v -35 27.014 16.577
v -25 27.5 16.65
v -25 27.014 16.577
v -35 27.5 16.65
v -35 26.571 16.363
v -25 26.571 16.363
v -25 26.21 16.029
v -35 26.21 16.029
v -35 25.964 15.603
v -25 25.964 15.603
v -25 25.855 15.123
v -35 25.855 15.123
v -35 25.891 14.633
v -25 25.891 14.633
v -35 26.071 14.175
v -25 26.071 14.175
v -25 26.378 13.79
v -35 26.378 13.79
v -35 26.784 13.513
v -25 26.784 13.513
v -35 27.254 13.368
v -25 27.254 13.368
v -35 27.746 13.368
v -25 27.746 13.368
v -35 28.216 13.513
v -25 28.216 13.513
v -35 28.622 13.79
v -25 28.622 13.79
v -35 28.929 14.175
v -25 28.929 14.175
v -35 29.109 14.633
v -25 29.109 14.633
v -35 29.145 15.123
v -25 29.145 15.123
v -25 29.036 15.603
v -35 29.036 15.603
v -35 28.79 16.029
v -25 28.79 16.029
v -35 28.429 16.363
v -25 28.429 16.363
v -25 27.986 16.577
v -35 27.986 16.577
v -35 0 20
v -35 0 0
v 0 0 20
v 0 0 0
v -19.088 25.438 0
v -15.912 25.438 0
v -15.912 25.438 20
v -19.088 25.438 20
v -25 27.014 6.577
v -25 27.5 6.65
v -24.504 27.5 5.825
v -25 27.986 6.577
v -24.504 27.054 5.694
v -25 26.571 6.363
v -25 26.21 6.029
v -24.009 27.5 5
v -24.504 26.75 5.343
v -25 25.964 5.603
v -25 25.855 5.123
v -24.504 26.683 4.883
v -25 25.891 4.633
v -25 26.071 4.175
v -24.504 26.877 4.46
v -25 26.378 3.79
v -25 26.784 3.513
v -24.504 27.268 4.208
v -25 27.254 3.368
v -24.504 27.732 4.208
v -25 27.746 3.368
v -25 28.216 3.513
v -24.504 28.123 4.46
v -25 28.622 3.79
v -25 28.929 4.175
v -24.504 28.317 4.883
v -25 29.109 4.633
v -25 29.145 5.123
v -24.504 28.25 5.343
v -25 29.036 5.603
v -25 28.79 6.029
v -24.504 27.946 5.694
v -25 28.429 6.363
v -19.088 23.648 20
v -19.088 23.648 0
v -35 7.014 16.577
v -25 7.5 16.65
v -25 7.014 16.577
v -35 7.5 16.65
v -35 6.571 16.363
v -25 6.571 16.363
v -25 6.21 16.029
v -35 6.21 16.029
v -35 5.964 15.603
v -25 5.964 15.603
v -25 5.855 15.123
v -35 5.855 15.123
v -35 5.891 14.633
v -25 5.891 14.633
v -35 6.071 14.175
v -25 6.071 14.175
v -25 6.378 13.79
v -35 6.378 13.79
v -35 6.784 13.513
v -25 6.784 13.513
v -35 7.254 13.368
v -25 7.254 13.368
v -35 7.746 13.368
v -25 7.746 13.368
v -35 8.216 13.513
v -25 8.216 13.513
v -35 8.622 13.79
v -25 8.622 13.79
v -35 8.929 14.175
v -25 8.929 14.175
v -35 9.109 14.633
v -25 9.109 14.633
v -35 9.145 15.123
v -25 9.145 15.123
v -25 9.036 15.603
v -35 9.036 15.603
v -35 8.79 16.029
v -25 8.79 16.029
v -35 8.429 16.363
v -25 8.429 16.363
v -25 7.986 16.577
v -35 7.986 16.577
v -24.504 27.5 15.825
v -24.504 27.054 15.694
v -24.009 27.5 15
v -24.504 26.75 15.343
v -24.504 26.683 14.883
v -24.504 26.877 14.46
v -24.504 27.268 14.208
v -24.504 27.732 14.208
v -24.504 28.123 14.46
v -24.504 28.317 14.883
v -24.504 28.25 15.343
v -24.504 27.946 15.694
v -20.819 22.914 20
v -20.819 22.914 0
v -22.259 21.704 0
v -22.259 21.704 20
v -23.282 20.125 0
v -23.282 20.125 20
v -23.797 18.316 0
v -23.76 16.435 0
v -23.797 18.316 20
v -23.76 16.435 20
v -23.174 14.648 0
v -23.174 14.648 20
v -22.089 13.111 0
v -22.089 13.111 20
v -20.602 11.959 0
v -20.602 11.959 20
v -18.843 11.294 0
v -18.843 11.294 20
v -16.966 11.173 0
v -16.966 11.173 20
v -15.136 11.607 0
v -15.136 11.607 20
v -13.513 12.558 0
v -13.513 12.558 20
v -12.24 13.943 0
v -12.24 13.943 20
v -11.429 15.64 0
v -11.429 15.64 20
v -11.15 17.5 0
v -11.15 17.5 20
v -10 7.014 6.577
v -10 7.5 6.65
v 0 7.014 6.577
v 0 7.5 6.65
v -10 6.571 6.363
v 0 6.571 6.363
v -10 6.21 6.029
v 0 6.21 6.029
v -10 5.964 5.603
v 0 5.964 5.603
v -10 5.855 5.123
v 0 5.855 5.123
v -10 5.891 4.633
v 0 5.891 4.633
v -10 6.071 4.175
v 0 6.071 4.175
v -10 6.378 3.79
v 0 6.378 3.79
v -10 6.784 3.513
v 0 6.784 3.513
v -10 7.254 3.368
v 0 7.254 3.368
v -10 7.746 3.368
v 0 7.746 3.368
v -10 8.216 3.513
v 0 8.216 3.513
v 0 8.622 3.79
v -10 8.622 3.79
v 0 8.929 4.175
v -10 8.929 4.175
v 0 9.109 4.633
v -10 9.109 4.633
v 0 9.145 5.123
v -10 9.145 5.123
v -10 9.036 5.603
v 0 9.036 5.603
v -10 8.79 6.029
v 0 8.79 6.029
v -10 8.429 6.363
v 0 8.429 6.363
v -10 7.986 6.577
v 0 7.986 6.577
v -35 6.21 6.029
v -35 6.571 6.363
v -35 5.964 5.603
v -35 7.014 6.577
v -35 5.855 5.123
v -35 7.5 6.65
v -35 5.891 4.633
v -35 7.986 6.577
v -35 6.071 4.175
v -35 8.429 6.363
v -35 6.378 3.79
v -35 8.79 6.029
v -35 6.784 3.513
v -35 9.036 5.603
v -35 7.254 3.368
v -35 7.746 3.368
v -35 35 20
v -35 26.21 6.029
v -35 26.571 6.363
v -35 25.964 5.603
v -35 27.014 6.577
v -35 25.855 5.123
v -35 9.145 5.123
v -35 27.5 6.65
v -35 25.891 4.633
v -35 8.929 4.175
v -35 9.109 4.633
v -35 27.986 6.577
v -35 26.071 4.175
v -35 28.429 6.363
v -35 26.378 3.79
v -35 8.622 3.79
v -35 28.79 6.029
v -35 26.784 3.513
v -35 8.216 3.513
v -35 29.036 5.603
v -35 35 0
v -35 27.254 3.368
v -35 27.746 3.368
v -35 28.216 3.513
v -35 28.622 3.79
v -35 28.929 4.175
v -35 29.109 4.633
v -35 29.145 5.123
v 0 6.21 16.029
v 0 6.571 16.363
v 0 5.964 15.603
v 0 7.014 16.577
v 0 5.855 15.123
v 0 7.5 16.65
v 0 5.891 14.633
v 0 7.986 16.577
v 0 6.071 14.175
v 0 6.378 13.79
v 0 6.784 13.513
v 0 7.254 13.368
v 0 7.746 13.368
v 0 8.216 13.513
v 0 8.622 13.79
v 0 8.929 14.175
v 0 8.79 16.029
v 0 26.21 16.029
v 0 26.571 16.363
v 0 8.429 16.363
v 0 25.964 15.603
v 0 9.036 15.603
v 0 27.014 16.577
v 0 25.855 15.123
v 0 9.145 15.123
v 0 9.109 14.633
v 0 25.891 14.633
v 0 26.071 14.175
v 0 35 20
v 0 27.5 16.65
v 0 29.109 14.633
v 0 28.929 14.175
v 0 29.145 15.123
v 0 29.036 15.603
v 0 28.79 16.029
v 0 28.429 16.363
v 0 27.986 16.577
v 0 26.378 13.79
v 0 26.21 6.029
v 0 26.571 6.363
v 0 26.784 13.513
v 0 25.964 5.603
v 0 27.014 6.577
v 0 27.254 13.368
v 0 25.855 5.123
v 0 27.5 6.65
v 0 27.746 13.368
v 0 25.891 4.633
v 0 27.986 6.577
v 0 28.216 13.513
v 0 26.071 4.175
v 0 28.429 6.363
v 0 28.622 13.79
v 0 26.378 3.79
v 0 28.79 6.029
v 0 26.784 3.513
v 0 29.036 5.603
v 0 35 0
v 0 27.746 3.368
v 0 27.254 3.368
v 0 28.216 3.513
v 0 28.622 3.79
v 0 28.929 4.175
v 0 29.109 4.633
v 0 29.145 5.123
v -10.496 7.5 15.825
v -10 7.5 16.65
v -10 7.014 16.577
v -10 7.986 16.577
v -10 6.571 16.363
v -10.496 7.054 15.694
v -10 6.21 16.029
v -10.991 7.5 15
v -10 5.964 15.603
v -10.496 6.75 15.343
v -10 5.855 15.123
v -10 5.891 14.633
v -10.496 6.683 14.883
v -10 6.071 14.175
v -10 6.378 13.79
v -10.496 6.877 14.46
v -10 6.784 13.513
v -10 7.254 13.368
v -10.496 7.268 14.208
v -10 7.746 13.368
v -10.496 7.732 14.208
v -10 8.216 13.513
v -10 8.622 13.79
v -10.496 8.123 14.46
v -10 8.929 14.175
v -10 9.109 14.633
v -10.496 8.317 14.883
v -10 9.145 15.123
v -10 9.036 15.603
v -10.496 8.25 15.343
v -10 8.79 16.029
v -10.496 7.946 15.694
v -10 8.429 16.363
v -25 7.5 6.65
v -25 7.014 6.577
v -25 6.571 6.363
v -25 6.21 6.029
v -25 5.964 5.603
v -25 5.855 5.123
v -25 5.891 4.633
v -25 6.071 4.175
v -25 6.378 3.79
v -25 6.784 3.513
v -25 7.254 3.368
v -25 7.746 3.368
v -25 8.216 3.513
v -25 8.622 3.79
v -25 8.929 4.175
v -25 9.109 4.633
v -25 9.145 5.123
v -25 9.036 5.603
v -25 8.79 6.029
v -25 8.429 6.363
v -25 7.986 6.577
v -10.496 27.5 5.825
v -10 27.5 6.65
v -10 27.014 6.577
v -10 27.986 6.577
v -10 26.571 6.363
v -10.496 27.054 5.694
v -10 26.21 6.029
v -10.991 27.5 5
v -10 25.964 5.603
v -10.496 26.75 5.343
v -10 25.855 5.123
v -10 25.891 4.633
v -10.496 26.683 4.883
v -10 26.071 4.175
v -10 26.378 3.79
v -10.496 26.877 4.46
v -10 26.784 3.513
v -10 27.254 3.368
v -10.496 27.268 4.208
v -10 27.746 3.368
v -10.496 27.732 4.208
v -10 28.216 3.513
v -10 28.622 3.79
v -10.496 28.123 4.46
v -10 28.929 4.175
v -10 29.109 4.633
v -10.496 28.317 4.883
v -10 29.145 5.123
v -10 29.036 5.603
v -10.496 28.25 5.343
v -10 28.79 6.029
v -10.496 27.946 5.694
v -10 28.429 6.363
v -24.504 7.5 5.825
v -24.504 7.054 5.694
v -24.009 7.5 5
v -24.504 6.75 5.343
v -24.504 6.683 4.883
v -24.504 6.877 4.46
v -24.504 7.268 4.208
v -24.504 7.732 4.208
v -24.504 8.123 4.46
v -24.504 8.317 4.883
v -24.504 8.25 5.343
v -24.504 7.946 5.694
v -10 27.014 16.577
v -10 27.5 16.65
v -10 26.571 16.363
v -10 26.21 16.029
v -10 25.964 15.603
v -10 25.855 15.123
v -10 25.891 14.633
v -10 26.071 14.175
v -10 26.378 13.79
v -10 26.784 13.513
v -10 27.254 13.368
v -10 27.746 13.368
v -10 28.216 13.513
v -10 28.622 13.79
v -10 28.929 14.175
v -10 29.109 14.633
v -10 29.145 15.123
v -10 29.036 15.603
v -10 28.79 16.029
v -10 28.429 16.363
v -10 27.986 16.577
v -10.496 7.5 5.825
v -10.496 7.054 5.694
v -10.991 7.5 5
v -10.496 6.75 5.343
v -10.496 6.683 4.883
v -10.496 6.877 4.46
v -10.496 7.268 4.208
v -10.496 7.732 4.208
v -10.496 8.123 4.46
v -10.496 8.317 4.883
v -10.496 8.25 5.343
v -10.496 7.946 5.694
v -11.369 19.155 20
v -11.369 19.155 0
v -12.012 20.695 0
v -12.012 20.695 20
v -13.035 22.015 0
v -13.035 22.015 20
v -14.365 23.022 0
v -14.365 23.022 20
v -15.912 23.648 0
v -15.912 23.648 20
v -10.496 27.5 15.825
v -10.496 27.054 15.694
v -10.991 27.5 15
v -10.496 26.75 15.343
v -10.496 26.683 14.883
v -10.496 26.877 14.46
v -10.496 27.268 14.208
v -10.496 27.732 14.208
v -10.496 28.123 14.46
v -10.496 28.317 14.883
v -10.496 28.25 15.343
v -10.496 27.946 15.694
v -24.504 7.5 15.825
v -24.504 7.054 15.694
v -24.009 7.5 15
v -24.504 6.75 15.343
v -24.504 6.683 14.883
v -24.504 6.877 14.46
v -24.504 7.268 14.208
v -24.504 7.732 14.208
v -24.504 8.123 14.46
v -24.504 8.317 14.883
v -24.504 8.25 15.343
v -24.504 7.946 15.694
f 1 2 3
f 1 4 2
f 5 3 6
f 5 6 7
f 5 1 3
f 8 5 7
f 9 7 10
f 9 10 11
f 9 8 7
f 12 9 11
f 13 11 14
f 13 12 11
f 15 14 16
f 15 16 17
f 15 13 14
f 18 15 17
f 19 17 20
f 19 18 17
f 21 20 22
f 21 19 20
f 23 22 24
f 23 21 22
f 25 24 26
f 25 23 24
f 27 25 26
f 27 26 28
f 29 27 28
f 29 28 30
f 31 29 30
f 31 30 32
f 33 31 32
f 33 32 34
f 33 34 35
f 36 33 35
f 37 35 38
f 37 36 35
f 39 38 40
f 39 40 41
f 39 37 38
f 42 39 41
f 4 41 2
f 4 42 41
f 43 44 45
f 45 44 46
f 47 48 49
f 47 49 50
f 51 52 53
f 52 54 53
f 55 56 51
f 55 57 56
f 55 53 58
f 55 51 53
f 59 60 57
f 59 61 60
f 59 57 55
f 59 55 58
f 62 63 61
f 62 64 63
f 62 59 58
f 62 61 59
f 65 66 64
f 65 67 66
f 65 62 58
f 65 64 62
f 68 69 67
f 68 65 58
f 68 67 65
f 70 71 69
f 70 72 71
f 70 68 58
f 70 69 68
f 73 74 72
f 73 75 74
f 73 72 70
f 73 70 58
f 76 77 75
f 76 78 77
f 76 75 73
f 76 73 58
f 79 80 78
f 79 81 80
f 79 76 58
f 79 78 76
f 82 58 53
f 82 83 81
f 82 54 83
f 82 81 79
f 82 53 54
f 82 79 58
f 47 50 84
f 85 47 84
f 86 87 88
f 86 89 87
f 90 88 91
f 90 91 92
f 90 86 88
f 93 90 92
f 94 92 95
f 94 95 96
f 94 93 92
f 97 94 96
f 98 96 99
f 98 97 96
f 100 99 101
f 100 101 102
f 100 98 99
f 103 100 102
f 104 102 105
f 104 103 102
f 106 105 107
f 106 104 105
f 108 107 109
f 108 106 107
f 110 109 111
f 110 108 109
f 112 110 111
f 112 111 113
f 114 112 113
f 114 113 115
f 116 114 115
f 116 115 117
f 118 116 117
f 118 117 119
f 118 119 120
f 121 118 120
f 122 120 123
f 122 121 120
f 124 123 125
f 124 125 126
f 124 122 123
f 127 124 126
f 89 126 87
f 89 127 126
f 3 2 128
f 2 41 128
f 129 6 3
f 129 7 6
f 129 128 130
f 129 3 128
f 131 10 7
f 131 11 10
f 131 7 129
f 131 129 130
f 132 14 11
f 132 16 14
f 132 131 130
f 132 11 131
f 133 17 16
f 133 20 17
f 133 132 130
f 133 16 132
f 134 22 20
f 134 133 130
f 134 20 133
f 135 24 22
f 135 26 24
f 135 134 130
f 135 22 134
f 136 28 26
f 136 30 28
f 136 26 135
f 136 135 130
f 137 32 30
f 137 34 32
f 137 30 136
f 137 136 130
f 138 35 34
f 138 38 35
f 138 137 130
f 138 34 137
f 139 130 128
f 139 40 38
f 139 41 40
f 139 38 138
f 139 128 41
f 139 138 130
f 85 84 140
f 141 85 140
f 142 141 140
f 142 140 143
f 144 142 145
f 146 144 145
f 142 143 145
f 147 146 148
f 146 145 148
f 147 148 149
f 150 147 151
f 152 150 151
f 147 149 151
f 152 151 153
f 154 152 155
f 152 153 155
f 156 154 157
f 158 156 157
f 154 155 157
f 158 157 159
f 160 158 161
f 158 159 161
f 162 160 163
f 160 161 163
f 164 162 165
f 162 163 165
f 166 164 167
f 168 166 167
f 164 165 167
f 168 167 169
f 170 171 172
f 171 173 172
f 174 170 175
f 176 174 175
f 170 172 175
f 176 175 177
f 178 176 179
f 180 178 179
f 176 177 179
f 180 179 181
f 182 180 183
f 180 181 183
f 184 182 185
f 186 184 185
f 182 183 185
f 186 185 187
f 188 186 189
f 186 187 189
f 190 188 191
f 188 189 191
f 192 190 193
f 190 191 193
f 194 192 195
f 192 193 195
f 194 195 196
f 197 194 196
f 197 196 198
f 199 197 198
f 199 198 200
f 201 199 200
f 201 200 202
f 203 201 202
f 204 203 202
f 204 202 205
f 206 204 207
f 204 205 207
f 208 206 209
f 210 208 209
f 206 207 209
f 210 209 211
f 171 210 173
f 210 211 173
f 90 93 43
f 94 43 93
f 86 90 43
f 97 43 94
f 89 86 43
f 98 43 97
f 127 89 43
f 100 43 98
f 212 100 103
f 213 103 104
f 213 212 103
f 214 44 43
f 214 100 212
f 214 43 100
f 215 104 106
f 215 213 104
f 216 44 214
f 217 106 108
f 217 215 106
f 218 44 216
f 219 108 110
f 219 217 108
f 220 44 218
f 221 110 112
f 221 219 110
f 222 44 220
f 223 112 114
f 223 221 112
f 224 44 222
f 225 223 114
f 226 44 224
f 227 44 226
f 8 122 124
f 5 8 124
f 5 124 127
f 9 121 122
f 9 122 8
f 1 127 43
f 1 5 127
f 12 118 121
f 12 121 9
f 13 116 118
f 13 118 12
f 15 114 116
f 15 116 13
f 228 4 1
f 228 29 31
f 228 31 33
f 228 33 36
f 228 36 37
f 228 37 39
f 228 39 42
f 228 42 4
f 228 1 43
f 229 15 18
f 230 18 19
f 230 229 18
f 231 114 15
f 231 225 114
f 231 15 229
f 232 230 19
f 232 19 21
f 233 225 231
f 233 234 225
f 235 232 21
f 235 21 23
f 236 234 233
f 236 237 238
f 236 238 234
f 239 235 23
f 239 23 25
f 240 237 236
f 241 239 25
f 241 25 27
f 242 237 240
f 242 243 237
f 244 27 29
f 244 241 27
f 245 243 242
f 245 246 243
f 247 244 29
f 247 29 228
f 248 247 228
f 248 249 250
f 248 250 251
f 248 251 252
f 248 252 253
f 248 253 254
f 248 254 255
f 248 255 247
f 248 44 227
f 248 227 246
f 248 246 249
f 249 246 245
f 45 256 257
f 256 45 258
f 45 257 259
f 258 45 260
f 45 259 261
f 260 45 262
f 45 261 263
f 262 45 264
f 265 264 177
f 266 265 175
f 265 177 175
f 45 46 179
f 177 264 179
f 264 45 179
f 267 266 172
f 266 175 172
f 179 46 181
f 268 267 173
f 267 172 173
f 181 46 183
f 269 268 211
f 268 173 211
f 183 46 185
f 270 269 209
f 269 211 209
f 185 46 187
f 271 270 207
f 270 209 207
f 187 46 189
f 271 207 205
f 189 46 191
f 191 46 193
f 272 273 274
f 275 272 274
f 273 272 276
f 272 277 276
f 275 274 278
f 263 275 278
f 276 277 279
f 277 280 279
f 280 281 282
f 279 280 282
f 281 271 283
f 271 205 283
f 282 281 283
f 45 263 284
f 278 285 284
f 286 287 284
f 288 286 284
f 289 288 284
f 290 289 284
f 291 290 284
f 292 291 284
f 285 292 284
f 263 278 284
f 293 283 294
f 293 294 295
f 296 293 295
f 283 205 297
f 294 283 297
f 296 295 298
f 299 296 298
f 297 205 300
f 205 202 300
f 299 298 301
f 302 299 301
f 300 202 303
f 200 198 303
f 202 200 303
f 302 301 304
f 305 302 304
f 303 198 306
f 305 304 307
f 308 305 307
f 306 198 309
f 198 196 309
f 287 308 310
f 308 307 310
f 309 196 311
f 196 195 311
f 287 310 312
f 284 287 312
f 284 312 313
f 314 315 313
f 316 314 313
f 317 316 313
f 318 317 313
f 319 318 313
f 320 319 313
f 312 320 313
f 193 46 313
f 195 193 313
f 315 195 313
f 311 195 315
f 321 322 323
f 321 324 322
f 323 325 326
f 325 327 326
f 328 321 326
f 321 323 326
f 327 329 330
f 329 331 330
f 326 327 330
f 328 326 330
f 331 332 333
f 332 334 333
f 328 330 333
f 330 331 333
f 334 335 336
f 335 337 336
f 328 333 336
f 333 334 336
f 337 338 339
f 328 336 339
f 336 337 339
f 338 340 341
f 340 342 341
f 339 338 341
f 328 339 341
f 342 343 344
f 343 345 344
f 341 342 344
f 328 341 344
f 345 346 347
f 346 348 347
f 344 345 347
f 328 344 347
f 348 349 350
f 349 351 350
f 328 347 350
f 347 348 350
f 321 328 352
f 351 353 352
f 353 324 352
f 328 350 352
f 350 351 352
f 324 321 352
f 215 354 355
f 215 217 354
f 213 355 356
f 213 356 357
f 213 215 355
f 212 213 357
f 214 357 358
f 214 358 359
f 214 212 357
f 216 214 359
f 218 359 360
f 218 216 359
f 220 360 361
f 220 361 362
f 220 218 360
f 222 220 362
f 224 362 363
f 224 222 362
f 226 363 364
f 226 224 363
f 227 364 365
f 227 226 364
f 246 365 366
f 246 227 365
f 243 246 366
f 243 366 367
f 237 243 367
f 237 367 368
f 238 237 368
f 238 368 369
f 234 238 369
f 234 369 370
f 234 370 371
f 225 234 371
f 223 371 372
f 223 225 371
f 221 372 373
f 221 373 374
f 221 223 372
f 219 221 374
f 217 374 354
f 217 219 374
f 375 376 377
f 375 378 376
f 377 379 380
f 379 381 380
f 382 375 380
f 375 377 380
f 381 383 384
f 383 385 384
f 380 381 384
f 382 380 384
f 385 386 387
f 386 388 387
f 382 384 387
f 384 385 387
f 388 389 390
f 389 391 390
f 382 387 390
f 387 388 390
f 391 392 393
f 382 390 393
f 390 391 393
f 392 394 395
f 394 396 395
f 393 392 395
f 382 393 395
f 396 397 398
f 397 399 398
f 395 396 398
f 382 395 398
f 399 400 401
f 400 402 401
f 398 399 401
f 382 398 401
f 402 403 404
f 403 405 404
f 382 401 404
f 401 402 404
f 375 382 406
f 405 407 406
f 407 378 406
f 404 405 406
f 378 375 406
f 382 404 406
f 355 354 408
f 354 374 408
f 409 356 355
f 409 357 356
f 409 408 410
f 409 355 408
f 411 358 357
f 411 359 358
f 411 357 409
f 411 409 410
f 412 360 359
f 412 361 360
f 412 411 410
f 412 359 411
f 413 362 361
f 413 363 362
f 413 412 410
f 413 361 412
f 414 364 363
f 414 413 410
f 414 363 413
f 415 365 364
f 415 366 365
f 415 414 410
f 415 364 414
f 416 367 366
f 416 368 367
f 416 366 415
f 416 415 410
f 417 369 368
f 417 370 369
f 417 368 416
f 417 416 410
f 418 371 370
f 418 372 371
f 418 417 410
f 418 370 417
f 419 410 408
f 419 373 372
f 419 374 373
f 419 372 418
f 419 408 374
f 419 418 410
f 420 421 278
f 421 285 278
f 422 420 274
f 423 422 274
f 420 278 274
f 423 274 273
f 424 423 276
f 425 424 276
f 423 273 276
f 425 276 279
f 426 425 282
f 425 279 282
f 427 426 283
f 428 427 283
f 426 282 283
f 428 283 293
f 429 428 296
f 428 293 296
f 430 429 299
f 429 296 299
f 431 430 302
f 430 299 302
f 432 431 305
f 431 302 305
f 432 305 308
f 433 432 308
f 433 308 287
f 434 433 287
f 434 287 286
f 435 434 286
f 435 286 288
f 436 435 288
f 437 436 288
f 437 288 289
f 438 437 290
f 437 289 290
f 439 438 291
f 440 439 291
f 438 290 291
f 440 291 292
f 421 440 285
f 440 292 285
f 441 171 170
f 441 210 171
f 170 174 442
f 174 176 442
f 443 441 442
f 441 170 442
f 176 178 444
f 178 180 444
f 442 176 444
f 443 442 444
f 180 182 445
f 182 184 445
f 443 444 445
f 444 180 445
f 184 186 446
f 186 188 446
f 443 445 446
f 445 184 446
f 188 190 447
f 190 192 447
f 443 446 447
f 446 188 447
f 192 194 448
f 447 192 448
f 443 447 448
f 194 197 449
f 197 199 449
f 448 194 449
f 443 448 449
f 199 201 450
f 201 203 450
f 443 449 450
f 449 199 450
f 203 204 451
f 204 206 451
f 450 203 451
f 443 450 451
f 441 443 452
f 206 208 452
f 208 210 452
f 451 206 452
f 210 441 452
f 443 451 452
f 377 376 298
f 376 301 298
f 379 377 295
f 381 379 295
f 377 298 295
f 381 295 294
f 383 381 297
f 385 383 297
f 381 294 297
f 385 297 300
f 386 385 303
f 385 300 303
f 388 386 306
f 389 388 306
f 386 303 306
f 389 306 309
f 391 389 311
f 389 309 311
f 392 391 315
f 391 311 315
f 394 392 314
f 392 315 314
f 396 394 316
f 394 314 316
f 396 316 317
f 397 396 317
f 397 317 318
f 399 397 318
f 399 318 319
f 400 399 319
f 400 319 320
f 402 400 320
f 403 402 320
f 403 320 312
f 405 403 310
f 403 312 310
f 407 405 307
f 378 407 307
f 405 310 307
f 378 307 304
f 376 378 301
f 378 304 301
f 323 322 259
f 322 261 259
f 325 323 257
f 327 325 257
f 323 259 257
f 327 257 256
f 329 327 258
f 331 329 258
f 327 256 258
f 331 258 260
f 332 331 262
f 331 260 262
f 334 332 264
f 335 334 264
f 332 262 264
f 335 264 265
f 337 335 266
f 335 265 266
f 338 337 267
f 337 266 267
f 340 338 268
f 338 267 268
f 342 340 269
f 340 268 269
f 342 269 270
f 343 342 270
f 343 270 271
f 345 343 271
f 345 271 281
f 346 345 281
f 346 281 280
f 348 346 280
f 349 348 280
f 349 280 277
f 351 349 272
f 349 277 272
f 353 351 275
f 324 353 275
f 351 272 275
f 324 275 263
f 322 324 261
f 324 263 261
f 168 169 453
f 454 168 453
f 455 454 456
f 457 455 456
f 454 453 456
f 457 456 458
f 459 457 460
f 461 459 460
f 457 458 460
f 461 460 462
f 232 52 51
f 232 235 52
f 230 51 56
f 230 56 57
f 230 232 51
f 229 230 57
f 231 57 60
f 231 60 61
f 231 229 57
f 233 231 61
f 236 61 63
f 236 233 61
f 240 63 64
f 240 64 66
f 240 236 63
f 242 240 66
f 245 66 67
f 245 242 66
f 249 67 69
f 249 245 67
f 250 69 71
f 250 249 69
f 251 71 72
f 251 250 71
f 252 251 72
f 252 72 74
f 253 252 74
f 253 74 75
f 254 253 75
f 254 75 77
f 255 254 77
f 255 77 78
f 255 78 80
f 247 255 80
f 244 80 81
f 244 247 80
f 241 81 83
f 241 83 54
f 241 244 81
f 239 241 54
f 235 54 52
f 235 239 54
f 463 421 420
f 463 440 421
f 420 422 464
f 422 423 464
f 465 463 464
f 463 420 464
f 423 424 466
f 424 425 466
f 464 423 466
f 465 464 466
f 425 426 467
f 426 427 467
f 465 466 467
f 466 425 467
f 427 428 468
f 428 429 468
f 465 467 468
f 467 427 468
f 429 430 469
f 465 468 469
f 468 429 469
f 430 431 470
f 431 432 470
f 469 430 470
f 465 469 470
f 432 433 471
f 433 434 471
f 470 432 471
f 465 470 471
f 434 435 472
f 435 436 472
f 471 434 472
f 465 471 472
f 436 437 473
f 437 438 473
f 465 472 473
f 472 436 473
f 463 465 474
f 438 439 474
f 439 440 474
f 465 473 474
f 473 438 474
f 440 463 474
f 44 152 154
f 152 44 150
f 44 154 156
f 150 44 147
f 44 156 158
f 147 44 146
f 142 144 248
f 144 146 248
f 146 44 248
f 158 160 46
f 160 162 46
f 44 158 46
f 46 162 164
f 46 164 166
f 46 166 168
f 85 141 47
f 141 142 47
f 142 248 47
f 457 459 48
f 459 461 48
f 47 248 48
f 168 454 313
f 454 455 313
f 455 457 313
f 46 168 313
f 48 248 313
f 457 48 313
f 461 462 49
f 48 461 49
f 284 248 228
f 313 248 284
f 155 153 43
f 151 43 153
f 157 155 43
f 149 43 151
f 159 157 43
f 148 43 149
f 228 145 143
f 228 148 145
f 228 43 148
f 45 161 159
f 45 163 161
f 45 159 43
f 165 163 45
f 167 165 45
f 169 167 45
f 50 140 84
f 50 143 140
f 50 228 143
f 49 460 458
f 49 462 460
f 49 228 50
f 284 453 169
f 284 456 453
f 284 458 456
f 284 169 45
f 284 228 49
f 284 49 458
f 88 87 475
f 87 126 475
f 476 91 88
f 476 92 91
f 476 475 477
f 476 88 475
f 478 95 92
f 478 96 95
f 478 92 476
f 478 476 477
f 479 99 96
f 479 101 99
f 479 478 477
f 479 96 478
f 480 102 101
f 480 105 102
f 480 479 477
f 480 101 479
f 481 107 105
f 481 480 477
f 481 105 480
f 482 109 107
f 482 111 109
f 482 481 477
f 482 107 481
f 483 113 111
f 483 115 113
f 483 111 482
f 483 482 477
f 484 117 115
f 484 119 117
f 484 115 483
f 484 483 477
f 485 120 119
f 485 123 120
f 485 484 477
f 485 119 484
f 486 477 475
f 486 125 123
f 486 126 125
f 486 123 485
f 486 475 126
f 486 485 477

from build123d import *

# Parameters (mm, degrees)
SKETCH1_W                      = 35
SKETCH1_H                      = 35
BOSS_EXTRUDE1_DEPTH            = 20
CUT_EXTRUDE1_DEPTH             = 54.38539126
M4X0_7_TAPPED_HOLE1_AT_2_COUNT = 2
M4X0_7_TAPPED_HOLE1_AT_2_PITCH = 22.360679775
M4X0_7_TAPPED_HOLE1_AT_3_COUNT = 2
M4X0_7_TAPPED_HOLE1_AT_3_PITCH = 20
M4X0_7_TAPPED_HOLE1_AT_4_COUNT = 2
M4X0_7_TAPPED_HOLE1_AT_4_PITCH = 10


with BuildPart() as part:
    # Sketch1 → Boss-Extrude1 (new body)
    with BuildSketch(Plane.XY):
        with Locations((-17.5, 17.5)):
            Rectangle(SKETCH1_W, SKETCH1_H)
    extrude(amount=BOSS_EXTRUDE1_DEPTH)

    # Sketch2 → Cut-Extrude1 (cut, through all)
    with BuildSketch(Plane.XY.offset(20)):
        with BuildLine():
            Line((-15.9125, 25.4375), (-19.0875, 25.4375))
            Line((-19.0875, 25.4375), (-19.0875, 23.648361062))
            ThreePointArc((-19.0875, 23.648361062), (-17.5, 11.15), (-15.9125, 23.648361062))
            Line((-15.9125, 23.648361062), (-15.9125, 25.4375))
        make_face()
    extrude(amount=-CUT_EXTRUDE1_DEPTH, mode=Mode.SUBTRACT)

    # Sketch4 → M4x0.7 Tapped Hole1 (revolve, cut)
    with BuildSketch(Plane(origin=(-35, 27.5, 5), x_dir=(0, 0, 1), z_dir=(0, 1, 0))):
        Polygon((0, 0), (0, 10.991420021), (1.65, 10), (1.65, 0), align=None)
    m4x0_7_tapped_hole1 = revolve(axis=Axis((-41.35, 27.5, 5), (1, 0, 0)), mode=Mode.SUBTRACT)

    # M4x0.7 Tapped Hole1 at 2: M4x0.7 Tapped Hole1 ×2
    with Locations(*[Vector(0, -0.8944271909999159, 0.4472135954999581) * (i * M4X0_7_TAPPED_HOLE1_AT_2_PITCH) for i in range(1, M4X0_7_TAPPED_HOLE1_AT_2_COUNT)]):
        add(m4x0_7_tapped_hole1, mode=Mode.SUBTRACT)

    # M4x0.7 Tapped Hole1 at 3: M4x0.7 Tapped Hole1 ×2
    with Locations(*[(0, -i * M4X0_7_TAPPED_HOLE1_AT_3_PITCH, 0) for i in range(1, M4X0_7_TAPPED_HOLE1_AT_3_COUNT)]):
        add(m4x0_7_tapped_hole1, mode=Mode.SUBTRACT)

    # M4x0.7 Tapped Hole1 at 4: M4x0.7 Tapped Hole1 ×2
    with Locations(*[(0, 0, i * M4X0_7_TAPPED_HOLE1_AT_4_PITCH) for i in range(1, M4X0_7_TAPPED_HOLE1_AT_4_COUNT)]):
        add(m4x0_7_tapped_hole1, mode=Mode.SUBTRACT)

    # Mirror1: M4x0.7 Tapped Hole1 across plane
    add(m4x0_7_tapped_hole1.mirror(Plane.ZY.offset(17.5)), mode=Mode.SUBTRACT)

    # Mirror1 copy 1 sketch → Mirror1 copy 1 (revolve, cut)
    with BuildSketch(Plane(origin=(0, 7.5, 15), x_dir=(0, 0, 1), z_dir=(0, 1, 0))):
        Polygon((0, 0), (0, -10.991420021), (1.65, -10), (1.65, 0), align=None)
    revolve(axis=Axis((6.35, 7.5, 15), (1, 0, 0)), mode=Mode.SUBTRACT)

    # Mirror1 copy 2 sketch → Mirror1 copy 2 (revolve, cut)
    with BuildSketch(Plane(origin=(0, 7.5, 5), x_dir=(0, 0, 1), z_dir=(0, 1, 0))):
        Polygon((0, 0), (0, -10.991420021), (1.65, -10), (1.65, 0), align=None)
    revolve(axis=Axis((6.35, 7.5, 5), (1, 0, 0)), mode=Mode.SUBTRACT)

    # Mirror1 copy 3 sketch → Mirror1 copy 3 (revolve, cut)
    with BuildSketch(Plane(origin=(0, 27.5, 15), x_dir=(0, 0, 1), z_dir=(0, 1, 0))):
        Polygon((0, 0), (0, -10.991420021), (1.65, -10), (1.65, 0), align=None)
    revolve(axis=Axis((6.35, 27.5, 15), (1, 0, 0)), mode=Mode.SUBTRACT)


solid = part.part
